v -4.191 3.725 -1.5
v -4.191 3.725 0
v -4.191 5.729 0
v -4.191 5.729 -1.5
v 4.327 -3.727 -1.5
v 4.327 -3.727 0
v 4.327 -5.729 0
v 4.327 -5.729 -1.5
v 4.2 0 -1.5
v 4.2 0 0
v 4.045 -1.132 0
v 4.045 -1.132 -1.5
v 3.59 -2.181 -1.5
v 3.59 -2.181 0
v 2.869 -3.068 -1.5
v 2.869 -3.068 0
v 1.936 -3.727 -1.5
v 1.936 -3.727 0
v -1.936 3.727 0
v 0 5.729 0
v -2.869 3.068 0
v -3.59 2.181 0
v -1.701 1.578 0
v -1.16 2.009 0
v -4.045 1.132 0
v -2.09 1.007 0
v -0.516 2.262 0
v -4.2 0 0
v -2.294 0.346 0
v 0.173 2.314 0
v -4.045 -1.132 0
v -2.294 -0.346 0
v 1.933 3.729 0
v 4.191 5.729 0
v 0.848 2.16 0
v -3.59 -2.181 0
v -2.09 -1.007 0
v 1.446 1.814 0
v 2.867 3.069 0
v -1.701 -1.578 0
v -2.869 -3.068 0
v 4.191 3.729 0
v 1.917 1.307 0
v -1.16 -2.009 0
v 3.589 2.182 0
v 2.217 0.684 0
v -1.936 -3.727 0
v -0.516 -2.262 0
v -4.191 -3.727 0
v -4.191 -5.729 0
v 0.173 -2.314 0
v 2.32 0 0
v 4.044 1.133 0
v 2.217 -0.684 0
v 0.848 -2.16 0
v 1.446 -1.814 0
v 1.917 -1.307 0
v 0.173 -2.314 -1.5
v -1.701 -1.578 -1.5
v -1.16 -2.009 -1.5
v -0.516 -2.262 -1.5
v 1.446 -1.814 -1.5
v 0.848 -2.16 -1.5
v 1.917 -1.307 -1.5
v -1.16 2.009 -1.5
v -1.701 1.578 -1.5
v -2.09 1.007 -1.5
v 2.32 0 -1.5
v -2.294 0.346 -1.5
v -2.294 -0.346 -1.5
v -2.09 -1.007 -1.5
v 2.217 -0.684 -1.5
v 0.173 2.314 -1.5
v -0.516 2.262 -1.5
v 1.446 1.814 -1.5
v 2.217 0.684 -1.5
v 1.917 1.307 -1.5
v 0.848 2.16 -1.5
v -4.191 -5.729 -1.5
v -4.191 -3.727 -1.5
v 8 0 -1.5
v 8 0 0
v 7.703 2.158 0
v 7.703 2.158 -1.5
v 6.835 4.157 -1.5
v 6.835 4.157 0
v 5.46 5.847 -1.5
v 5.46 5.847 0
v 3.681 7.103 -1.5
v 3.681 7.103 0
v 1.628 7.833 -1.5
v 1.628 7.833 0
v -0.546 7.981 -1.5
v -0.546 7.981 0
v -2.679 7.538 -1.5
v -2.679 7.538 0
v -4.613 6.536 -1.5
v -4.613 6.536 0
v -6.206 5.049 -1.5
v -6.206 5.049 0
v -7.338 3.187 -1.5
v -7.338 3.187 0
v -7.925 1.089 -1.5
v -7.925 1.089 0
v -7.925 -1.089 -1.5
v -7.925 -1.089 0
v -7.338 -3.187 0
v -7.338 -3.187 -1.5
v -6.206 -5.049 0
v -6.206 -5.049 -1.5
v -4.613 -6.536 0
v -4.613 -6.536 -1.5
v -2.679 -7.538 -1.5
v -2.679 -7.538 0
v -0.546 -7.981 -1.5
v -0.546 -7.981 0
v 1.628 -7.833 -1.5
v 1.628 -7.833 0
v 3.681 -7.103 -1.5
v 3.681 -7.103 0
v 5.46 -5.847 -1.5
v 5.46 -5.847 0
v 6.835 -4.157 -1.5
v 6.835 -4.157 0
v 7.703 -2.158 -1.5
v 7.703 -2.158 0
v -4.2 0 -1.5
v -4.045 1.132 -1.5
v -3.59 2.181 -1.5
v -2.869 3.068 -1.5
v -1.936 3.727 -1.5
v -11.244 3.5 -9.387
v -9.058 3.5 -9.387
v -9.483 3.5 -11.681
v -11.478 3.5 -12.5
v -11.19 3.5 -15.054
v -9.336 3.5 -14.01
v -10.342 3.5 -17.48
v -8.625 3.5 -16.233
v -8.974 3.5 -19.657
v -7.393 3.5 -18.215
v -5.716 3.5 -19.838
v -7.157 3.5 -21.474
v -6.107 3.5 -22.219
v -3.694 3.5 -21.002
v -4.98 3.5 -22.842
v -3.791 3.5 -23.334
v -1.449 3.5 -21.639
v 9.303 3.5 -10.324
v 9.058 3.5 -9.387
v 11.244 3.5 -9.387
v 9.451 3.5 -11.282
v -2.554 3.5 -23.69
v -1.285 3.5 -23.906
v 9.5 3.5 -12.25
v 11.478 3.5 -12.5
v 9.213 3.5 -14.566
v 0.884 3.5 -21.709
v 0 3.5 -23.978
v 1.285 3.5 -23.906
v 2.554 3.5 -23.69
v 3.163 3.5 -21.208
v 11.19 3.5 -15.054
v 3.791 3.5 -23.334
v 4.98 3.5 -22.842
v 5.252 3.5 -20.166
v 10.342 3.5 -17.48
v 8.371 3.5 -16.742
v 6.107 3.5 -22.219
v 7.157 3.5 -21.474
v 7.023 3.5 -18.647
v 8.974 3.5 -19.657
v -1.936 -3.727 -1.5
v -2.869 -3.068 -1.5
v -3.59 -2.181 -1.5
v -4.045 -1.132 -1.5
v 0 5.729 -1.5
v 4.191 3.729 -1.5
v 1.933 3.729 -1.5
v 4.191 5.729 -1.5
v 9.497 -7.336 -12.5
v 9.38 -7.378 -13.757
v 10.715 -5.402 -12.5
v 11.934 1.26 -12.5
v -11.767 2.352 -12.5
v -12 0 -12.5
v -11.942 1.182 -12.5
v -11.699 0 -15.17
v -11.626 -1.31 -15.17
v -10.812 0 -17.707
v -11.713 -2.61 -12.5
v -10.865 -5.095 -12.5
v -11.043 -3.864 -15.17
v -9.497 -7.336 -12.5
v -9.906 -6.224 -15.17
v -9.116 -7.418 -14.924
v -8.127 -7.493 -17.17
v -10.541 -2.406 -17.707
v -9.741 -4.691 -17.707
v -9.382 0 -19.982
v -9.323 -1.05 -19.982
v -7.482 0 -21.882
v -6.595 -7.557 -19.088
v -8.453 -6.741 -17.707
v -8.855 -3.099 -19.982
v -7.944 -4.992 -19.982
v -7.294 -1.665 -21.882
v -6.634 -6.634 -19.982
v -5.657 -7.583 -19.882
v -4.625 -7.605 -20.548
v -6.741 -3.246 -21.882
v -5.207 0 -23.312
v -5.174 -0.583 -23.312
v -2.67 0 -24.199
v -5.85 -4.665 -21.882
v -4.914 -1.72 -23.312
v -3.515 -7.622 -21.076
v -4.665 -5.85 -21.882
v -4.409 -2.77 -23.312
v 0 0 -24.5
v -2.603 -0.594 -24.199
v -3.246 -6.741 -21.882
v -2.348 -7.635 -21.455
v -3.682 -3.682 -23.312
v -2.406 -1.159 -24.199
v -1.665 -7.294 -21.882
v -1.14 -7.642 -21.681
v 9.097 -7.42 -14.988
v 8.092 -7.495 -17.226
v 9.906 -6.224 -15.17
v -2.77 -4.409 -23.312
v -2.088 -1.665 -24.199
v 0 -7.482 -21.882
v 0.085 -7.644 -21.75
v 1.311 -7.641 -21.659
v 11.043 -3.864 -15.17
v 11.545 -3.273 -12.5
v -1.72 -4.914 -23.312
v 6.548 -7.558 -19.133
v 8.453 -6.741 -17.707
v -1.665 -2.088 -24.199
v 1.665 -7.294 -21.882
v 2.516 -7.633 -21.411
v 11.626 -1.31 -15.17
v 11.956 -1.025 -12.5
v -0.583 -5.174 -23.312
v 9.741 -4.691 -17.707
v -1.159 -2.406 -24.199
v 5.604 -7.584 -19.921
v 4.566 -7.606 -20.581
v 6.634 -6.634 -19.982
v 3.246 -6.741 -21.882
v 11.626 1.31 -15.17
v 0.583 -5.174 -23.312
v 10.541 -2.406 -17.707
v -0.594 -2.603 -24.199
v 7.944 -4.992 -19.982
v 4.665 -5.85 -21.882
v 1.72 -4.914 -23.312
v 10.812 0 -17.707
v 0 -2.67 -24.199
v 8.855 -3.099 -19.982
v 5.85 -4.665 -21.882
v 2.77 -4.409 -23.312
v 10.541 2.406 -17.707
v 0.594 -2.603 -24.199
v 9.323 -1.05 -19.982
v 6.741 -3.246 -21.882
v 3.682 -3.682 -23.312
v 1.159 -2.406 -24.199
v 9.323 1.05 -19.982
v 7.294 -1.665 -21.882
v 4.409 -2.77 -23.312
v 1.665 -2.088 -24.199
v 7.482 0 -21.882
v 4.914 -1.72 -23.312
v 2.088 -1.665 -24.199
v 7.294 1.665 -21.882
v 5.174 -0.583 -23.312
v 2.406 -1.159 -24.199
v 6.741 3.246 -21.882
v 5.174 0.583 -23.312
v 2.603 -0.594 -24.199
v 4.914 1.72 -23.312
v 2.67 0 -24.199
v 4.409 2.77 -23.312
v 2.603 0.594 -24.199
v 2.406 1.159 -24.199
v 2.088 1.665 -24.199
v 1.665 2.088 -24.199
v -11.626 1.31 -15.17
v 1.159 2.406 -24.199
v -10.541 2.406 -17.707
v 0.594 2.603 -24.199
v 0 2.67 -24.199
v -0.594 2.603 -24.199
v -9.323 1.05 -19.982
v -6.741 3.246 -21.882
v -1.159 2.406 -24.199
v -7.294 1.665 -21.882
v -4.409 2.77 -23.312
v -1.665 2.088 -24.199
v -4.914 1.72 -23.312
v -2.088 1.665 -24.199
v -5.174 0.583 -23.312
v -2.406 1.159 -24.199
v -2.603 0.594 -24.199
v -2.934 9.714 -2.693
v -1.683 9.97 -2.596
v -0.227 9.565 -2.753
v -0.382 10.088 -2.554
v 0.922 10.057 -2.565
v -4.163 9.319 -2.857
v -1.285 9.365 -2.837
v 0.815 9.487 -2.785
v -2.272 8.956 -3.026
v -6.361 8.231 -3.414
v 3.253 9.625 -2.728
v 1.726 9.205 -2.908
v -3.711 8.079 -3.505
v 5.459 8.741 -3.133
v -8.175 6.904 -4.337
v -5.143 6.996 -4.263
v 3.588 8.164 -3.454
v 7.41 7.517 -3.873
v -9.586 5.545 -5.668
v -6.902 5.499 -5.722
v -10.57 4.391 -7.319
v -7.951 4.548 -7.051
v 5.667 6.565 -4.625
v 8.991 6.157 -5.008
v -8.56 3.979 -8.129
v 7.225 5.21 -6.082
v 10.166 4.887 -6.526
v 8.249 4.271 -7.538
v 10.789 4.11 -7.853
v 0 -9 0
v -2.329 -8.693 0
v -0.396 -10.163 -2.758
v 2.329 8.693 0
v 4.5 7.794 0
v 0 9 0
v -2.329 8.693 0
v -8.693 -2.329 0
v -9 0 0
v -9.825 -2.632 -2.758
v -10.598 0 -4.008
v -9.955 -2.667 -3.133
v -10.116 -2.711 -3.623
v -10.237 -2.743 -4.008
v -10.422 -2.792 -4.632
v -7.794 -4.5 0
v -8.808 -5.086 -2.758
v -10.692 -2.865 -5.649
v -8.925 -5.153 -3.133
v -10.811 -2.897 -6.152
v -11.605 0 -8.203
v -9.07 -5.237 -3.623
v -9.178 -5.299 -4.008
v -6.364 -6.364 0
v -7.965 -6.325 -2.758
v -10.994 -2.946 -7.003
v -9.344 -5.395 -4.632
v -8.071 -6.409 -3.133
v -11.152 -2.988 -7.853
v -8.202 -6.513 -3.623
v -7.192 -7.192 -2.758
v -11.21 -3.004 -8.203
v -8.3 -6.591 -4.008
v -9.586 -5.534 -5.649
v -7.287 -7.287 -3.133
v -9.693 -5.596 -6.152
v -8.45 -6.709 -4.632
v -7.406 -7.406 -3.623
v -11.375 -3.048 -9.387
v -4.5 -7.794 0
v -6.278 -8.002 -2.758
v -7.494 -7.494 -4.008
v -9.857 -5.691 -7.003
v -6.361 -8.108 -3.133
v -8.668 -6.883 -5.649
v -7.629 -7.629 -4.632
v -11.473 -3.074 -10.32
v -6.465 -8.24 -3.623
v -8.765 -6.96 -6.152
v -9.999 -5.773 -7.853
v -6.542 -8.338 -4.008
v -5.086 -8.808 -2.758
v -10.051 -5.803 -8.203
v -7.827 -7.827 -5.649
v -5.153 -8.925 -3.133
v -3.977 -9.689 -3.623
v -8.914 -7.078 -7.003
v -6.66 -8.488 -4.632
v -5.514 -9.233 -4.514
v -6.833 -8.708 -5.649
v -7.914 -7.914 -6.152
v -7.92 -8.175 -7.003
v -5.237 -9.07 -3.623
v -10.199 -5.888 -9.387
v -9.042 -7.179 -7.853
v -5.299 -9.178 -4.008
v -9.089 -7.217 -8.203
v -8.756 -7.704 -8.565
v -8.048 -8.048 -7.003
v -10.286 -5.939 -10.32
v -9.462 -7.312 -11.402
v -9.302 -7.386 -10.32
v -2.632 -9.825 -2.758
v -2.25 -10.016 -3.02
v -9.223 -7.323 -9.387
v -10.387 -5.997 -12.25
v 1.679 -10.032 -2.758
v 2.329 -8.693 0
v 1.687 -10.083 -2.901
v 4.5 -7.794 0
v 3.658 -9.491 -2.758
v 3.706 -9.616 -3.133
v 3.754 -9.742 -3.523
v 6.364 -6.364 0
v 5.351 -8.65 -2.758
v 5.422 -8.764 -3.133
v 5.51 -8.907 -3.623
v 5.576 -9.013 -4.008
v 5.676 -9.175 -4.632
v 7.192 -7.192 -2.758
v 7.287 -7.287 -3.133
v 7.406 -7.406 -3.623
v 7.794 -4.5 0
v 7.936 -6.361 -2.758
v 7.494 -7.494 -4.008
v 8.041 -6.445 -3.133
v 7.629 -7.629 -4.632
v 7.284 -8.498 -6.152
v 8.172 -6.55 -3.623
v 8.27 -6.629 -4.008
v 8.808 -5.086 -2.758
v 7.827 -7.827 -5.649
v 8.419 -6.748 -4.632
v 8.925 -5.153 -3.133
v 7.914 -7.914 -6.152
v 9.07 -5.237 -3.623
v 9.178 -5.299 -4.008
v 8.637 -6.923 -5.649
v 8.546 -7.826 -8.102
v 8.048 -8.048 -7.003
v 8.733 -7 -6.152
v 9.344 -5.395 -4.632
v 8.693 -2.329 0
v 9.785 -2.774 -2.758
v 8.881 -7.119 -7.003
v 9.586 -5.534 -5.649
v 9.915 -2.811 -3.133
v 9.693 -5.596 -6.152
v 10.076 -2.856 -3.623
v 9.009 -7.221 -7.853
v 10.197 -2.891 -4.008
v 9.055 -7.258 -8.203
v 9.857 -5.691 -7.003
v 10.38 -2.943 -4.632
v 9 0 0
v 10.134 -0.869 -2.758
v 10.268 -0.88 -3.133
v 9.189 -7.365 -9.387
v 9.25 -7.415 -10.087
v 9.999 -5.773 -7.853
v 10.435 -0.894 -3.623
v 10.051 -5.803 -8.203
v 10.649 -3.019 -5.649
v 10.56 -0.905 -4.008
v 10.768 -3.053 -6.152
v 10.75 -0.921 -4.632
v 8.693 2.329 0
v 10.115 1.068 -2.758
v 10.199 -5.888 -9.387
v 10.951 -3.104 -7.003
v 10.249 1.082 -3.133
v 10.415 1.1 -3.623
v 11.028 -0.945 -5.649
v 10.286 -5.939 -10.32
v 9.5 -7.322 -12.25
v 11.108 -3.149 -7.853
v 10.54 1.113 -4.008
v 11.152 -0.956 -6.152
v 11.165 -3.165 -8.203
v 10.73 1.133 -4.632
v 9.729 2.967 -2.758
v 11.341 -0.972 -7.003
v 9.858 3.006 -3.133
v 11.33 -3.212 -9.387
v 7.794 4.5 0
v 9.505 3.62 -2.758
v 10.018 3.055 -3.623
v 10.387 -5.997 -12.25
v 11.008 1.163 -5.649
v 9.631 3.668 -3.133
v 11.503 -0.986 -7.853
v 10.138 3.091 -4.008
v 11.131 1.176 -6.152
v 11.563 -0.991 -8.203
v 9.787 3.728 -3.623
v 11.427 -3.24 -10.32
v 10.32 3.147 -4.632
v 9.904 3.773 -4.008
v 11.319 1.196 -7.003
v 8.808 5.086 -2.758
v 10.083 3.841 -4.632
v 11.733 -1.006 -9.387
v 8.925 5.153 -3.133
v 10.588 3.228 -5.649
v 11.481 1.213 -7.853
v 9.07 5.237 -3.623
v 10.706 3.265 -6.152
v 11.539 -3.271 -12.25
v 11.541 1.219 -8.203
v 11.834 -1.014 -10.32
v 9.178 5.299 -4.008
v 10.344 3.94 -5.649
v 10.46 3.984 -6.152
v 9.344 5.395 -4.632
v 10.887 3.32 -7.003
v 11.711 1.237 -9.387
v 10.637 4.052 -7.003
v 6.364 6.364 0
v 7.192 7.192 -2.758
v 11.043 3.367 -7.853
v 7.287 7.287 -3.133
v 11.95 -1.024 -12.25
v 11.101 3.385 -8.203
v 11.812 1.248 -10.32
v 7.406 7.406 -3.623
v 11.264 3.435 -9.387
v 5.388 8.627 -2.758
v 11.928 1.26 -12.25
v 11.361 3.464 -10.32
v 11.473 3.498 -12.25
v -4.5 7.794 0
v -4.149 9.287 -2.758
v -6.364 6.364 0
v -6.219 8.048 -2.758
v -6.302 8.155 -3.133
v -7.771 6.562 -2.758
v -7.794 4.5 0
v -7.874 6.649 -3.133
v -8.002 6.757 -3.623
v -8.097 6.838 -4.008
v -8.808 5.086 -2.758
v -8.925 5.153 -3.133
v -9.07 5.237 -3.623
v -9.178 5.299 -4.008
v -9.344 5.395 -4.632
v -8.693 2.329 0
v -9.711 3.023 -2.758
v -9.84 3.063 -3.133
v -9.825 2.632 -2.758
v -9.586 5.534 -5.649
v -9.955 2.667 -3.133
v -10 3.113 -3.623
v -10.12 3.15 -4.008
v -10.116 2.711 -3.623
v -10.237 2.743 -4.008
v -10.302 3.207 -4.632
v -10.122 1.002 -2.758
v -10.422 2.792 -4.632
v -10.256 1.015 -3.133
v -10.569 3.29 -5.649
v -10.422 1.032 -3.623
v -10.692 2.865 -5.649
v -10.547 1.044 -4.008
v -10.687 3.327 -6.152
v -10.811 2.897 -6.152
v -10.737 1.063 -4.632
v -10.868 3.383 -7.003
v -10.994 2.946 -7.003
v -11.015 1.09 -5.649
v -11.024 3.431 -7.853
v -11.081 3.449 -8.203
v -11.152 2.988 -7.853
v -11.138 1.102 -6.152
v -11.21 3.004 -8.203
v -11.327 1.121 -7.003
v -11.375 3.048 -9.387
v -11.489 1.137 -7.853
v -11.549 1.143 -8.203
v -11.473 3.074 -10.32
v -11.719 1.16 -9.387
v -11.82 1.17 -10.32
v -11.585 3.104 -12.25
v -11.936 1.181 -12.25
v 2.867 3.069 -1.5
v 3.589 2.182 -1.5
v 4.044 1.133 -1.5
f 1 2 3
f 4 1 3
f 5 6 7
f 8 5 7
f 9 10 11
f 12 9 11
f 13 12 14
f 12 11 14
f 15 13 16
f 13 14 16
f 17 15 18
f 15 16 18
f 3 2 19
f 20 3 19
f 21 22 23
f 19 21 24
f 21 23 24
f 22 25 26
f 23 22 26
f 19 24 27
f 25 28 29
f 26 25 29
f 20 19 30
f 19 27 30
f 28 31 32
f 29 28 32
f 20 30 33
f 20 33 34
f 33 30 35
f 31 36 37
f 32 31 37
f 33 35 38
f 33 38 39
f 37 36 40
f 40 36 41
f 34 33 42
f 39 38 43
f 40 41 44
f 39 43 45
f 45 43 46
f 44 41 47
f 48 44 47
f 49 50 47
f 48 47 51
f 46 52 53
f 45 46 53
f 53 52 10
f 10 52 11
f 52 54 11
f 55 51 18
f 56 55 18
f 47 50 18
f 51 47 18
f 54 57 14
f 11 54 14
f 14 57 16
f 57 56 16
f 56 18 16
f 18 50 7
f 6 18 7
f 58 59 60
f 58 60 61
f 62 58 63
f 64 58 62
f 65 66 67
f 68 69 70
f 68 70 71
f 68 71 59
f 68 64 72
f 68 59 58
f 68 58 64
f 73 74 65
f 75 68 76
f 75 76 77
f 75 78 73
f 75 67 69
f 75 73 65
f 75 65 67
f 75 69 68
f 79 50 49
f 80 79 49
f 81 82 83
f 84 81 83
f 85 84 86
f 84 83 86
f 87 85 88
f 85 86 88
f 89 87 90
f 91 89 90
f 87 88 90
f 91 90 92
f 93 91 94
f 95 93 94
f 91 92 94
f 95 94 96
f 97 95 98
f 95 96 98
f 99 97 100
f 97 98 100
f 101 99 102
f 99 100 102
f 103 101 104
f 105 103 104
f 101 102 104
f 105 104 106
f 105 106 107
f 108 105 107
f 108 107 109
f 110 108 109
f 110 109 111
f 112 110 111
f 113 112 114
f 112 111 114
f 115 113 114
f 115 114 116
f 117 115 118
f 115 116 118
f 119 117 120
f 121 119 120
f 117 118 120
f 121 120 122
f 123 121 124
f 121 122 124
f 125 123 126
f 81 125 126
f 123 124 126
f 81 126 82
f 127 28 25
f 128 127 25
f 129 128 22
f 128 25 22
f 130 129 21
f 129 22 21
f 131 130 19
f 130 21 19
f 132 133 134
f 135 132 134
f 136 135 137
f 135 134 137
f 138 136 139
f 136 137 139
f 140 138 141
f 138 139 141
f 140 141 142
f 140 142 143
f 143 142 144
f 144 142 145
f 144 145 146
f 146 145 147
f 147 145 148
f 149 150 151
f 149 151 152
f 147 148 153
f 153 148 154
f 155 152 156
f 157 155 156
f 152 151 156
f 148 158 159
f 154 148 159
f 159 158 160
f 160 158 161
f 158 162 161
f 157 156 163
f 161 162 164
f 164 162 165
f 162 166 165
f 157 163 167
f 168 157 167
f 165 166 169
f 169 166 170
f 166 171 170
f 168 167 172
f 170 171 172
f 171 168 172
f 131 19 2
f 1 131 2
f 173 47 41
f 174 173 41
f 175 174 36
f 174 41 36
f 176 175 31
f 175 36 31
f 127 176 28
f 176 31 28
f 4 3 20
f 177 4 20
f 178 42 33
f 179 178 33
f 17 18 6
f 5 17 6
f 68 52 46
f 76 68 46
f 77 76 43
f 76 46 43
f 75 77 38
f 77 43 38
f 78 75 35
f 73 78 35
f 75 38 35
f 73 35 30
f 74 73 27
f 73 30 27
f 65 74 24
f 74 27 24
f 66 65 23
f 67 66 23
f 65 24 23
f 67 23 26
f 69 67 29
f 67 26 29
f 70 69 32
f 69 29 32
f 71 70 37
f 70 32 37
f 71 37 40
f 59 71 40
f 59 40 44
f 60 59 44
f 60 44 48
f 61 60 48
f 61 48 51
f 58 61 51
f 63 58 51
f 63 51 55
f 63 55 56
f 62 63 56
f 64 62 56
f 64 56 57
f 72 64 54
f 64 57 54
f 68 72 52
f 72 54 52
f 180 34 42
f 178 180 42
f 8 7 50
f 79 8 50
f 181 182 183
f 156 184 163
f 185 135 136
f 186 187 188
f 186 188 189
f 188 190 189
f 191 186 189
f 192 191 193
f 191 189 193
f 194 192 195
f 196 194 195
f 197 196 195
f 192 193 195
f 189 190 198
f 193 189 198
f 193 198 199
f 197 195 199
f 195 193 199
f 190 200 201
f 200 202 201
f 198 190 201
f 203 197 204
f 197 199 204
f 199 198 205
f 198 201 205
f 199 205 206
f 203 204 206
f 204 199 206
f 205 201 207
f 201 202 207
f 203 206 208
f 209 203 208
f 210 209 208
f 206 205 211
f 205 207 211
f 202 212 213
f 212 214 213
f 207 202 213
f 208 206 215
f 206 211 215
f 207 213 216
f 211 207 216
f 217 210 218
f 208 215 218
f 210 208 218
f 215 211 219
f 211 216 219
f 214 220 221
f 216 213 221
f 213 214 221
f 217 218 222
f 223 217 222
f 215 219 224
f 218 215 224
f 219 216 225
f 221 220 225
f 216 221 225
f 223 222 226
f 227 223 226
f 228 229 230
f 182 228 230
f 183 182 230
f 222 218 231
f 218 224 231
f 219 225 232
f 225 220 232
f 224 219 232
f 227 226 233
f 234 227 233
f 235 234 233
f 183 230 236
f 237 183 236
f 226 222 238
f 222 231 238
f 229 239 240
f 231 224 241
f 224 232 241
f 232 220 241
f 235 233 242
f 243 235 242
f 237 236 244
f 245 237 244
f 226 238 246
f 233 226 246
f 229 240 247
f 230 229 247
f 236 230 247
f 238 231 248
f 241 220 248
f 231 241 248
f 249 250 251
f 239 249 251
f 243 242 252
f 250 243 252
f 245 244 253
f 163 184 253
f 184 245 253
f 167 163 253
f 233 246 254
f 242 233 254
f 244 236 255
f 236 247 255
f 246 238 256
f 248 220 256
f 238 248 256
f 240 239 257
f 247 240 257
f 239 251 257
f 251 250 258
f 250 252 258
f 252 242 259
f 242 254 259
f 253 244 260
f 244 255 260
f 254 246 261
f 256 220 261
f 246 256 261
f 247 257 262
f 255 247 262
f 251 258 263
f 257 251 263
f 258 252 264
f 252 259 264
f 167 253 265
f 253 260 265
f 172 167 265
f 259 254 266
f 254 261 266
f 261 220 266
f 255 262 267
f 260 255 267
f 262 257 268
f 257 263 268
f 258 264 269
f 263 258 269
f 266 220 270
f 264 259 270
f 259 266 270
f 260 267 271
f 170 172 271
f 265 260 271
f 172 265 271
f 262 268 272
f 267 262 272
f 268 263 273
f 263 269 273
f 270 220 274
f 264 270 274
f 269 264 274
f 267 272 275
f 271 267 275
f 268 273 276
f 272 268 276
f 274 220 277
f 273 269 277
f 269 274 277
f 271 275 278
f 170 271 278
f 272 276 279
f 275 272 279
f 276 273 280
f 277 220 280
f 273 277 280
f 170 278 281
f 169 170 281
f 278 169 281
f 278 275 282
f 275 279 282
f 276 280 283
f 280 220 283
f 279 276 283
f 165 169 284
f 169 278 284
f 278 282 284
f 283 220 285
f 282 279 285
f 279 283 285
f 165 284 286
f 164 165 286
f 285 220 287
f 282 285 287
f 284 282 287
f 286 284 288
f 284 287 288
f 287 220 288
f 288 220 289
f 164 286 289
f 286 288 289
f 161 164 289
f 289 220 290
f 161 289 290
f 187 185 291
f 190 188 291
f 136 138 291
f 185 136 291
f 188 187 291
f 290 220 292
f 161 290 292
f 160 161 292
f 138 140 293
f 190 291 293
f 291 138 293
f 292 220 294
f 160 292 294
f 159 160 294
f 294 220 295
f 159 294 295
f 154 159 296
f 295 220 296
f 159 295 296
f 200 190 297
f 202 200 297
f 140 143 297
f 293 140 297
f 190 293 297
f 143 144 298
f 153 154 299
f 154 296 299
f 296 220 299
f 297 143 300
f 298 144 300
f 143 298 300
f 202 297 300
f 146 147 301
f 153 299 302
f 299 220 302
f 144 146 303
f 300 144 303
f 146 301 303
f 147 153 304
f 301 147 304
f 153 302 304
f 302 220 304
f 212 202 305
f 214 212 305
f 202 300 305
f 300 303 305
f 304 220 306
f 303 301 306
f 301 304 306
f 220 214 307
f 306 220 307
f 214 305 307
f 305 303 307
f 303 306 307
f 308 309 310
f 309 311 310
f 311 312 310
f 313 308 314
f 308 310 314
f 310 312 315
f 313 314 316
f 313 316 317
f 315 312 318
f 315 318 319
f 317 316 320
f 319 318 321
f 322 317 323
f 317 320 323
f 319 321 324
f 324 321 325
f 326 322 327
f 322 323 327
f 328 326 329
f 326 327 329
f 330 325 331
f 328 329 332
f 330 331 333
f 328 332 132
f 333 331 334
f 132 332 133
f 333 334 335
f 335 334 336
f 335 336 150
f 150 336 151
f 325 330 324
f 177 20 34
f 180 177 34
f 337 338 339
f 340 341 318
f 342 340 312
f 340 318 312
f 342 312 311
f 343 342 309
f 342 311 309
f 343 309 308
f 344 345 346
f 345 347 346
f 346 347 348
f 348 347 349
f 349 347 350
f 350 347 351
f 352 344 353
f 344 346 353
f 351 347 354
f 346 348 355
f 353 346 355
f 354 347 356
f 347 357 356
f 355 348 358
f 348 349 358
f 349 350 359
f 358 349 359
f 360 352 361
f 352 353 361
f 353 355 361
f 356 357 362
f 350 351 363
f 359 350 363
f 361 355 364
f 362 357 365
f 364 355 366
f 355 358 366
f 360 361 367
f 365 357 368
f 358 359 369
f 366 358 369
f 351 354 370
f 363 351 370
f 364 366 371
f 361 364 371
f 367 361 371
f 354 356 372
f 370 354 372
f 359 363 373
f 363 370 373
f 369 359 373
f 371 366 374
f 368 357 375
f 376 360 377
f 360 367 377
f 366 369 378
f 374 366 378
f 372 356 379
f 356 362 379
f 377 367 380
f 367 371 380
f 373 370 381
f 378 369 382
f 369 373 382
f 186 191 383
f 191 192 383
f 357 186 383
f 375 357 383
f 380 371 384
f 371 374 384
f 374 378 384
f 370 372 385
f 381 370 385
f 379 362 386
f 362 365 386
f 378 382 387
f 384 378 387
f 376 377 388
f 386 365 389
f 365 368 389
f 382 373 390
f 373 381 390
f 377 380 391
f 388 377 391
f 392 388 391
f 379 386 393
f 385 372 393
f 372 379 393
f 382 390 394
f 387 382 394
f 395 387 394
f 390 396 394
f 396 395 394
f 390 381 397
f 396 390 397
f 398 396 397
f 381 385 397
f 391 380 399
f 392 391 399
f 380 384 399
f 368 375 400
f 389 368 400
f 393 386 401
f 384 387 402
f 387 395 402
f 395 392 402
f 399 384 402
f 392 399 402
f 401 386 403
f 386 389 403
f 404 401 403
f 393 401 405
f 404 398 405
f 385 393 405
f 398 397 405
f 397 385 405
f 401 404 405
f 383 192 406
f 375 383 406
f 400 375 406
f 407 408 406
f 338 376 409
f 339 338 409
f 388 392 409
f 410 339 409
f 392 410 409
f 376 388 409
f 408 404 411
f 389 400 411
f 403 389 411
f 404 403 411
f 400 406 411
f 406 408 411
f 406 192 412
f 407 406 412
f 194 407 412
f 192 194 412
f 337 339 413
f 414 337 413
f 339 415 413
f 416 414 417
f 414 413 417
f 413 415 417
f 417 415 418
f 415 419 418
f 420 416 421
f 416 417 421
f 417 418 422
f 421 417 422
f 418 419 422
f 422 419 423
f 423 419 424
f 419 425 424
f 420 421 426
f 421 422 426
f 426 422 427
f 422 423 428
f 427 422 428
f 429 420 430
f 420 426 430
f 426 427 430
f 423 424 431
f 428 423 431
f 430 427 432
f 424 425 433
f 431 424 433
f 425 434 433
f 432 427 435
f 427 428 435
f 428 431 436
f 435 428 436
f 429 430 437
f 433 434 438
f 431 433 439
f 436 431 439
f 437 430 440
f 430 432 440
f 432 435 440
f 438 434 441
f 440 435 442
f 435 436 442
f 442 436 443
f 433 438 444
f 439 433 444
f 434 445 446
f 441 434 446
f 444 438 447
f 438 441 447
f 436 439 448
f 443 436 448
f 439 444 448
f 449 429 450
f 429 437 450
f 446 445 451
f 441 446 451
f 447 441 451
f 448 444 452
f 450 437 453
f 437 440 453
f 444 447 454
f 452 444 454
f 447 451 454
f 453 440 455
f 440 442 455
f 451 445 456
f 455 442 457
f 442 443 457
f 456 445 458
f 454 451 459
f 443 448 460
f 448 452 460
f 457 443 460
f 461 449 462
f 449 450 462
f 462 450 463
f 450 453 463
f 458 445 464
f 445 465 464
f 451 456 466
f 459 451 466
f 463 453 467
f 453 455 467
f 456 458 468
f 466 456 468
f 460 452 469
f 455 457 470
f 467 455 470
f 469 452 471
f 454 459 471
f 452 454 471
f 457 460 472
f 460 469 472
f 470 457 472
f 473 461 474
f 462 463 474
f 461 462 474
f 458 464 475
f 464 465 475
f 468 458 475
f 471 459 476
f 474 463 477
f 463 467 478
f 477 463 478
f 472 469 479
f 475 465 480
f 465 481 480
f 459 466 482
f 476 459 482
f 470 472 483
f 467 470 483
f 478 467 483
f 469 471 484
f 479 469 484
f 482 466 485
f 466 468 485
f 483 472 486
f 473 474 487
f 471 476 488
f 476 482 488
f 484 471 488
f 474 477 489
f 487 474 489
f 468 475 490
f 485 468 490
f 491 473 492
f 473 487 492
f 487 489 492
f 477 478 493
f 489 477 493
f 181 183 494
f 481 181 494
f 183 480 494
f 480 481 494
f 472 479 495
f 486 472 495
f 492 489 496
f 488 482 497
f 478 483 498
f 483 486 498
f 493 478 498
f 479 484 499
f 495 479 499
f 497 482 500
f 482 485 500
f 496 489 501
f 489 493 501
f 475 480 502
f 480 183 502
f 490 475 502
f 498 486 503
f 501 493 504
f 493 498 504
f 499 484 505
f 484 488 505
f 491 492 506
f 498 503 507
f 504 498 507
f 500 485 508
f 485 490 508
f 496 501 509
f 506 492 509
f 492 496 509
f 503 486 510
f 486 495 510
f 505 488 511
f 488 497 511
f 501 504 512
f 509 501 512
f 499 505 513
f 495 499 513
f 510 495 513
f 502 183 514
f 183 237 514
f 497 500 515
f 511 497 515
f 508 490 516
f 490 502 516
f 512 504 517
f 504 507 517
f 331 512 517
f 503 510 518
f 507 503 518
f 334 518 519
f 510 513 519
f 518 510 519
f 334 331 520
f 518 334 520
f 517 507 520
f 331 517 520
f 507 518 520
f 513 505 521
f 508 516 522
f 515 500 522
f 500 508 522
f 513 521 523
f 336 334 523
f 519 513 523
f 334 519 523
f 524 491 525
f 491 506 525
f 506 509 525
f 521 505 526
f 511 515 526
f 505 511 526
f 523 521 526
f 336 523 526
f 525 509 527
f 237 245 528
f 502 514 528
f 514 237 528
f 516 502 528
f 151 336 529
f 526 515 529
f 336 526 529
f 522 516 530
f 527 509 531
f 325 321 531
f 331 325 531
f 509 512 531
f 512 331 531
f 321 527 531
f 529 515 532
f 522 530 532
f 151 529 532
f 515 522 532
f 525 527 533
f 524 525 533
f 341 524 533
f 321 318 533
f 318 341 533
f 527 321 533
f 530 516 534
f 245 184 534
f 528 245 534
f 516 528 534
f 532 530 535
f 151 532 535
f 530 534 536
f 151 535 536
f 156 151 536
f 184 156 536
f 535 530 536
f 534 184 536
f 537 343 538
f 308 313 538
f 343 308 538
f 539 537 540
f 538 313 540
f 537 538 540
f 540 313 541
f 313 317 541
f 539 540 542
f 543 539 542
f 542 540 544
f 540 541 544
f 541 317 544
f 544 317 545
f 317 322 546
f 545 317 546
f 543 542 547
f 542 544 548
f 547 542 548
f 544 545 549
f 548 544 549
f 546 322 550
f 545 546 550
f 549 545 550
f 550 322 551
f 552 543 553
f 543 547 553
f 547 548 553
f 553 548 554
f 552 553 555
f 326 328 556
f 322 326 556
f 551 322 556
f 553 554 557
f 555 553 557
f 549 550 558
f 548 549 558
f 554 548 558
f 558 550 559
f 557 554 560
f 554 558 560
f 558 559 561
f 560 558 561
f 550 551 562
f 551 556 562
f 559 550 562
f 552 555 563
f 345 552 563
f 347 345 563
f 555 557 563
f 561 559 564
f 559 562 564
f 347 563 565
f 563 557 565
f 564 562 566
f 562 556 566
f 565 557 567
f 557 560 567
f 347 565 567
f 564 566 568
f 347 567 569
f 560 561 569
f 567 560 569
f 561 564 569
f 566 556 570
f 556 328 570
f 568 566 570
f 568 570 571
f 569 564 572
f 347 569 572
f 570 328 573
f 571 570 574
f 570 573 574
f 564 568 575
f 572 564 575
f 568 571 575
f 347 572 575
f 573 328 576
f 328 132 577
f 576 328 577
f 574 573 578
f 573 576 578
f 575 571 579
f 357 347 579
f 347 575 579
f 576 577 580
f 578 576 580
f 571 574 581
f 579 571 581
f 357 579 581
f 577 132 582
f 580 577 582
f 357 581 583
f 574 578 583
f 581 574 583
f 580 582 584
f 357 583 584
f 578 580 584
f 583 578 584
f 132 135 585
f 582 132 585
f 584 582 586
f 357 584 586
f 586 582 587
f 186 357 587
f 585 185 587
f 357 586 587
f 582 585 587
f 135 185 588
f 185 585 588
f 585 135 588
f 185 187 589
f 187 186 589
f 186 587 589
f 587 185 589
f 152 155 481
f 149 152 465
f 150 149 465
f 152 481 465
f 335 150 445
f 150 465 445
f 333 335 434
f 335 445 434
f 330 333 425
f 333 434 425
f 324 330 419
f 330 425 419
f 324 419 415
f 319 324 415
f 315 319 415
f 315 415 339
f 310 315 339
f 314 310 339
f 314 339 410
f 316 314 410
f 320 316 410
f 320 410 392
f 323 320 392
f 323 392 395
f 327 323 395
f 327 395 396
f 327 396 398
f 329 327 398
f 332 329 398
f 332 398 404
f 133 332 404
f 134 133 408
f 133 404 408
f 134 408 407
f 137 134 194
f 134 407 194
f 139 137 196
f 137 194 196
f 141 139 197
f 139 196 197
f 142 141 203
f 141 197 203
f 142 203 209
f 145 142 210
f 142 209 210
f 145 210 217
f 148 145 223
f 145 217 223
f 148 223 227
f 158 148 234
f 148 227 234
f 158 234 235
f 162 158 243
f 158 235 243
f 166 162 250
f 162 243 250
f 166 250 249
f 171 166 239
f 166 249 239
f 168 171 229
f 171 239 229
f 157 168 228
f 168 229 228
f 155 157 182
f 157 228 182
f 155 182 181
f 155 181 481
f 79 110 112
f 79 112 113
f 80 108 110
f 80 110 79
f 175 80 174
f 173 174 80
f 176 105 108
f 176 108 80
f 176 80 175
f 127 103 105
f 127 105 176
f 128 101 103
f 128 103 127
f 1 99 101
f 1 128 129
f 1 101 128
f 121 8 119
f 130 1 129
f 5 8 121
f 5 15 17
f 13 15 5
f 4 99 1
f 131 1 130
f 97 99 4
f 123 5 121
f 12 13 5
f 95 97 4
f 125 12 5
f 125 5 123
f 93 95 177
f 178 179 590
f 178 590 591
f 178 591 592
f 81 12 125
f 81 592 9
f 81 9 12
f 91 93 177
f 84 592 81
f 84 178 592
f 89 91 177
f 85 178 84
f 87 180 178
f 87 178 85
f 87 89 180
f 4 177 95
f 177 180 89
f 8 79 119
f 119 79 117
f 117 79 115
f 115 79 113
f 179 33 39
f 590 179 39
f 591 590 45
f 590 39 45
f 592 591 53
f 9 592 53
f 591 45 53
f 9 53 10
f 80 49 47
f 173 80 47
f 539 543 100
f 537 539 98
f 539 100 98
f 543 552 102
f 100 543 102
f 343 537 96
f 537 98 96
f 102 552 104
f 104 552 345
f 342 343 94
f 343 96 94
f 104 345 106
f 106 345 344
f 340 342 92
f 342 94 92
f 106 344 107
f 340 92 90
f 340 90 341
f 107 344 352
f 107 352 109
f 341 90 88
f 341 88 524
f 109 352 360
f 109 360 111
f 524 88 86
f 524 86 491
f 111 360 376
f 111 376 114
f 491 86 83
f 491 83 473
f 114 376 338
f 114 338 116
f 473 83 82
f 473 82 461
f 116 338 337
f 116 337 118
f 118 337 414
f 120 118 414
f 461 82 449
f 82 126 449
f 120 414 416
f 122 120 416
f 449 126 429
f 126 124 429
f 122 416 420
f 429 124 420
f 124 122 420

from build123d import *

# Parameters (mm, degrees)
F2_R     = 9.5
F3_DEPTH = 12.7
F4_R     = 8
F5_DEPTH = 1.5
F7_DEPTH = 12.7


# Not quite as in the source:
# - ends of sketch curves that miss each other by under 0.0002 mm in the source are joined
# - a feature names something its author has since deleted; it is built from what else it names


with BuildPart() as f1:
    # F0 (on Front) → F1 (revolve)
    with BuildSketch(Plane.XZ):
        with BuildLine():
            ThreePointArc((-12, -12.5), (-8.4852813742, -20.9852813742), (0, -24.5))
            Line((0, -24.5), (0, -12.5))
            Line((0, -12.5), (-12, -12.5))
        make_face()
        with BuildLine():
            Line((-12, -12.5), (0, -12.5))
            Line((0, -12.5), (0, 0))
            Line((0, 0), (-9, 0))
            ThreePointArc((-9, 0), (-11.177394056, -6.0874254266), (-12, -12.5))
        make_face()
    revolve(axis=Axis((0, 0, -12.25), (0, 0, 1)))

    # F2 (on Front) → F3 (cut, symmetric)
    with BuildSketch(Plane.XZ):
        with Locations((0, -12.25)):
            Circle(F2_R)
    extrude(amount=F3_DEPTH, both=True, mode=Mode.SUBTRACT)

    # F4 (on Top) → F5 (cut)
    with BuildSketch(Plane.XY):
        Circle(F4_R)
        with BuildLine():
            ThreePointArc((-1.9356951783, -3.7273427769), (-3.58956263, -2.1806054493), (-4.2, 0))
            ThreePointArc((-4.2, 0), (-3.58956263, 2.1806054493), (-1.9356951783, 3.7273427769))
            Line((-1.9356951783, 3.7273427769), (-4.191, 3.7254119238))
            Line((-4.191, 3.7254119238), (-4.191, 5.729))
            Line((-4.191, 5.729), (0, 5.729))
            Line((0, 5.729), (4.191, 5.7290075347))
            Line((4.191, 5.7290075347), (4.191, 3.7289706524))
            Line((4.191, 3.7289706524), (1.9325573402, 3.7289706524))
            ThreePointArc((1.9325573402, 3.7289706524), (3.5886446487, 2.1821158506), (4.2, 0))
            ThreePointArc((4.2, 0), (3.58956263, -2.1806054493), (1.9356951783, -3.7273427769))
            Line((1.9356951783, -3.7273427769), (4.3272348121, -3.7273427769))
            Line((4.3272348121, -3.7273427769), (4.3272348121, -5.7290102))
            Line((4.3272348121, -5.7290102), (0, -5.7290102))
            Line((0, -5.7290102), (-4.191, -5.7290102))
            Line((-4.191, -5.7290102), (-4.191, -3.7273427769))
            Line((-4.191, -3.7273427769), (-1.9356951783, -3.7273427769))
        make_face(mode=Mode.SUBTRACT)
        with BuildLine():
            ThreePointArc((-2.32, 0), (0, -2.32), (2.32, 0))
            ThreePointArc((2.32, 0), (0, 2.32), (-2.32, 0))
        make_face()
    extrude(amount=-F5_DEPTH, mode=Mode.SUBTRACT)

    # F6 (on Right) → F7 (cut, symmetric)
    with BuildSketch(Plane.YZ):
        with BuildLine():
            Line((3.5, -9.3865861699), (3.5, -26.5))
            Line((3.5, -26.5), (11.7441575179, -26.5))
            Line((11.7441575179, -26.5), (11.7441575179, -12.5))
            Line((11.7441575179, -12.5), (11.7441575179, -2.5))
            Line((11.7441575179, -2.5), (10.2463875179, -2.5))
            ThreePointArc((10.2463875179, -2.5), (6.0394031611, -5.1264769814), (3.5, -9.3865861699))
        make_face()
    extrude(amount=F7_DEPTH, both=True, mode=Mode.SUBTRACT)


solid = f1.part
